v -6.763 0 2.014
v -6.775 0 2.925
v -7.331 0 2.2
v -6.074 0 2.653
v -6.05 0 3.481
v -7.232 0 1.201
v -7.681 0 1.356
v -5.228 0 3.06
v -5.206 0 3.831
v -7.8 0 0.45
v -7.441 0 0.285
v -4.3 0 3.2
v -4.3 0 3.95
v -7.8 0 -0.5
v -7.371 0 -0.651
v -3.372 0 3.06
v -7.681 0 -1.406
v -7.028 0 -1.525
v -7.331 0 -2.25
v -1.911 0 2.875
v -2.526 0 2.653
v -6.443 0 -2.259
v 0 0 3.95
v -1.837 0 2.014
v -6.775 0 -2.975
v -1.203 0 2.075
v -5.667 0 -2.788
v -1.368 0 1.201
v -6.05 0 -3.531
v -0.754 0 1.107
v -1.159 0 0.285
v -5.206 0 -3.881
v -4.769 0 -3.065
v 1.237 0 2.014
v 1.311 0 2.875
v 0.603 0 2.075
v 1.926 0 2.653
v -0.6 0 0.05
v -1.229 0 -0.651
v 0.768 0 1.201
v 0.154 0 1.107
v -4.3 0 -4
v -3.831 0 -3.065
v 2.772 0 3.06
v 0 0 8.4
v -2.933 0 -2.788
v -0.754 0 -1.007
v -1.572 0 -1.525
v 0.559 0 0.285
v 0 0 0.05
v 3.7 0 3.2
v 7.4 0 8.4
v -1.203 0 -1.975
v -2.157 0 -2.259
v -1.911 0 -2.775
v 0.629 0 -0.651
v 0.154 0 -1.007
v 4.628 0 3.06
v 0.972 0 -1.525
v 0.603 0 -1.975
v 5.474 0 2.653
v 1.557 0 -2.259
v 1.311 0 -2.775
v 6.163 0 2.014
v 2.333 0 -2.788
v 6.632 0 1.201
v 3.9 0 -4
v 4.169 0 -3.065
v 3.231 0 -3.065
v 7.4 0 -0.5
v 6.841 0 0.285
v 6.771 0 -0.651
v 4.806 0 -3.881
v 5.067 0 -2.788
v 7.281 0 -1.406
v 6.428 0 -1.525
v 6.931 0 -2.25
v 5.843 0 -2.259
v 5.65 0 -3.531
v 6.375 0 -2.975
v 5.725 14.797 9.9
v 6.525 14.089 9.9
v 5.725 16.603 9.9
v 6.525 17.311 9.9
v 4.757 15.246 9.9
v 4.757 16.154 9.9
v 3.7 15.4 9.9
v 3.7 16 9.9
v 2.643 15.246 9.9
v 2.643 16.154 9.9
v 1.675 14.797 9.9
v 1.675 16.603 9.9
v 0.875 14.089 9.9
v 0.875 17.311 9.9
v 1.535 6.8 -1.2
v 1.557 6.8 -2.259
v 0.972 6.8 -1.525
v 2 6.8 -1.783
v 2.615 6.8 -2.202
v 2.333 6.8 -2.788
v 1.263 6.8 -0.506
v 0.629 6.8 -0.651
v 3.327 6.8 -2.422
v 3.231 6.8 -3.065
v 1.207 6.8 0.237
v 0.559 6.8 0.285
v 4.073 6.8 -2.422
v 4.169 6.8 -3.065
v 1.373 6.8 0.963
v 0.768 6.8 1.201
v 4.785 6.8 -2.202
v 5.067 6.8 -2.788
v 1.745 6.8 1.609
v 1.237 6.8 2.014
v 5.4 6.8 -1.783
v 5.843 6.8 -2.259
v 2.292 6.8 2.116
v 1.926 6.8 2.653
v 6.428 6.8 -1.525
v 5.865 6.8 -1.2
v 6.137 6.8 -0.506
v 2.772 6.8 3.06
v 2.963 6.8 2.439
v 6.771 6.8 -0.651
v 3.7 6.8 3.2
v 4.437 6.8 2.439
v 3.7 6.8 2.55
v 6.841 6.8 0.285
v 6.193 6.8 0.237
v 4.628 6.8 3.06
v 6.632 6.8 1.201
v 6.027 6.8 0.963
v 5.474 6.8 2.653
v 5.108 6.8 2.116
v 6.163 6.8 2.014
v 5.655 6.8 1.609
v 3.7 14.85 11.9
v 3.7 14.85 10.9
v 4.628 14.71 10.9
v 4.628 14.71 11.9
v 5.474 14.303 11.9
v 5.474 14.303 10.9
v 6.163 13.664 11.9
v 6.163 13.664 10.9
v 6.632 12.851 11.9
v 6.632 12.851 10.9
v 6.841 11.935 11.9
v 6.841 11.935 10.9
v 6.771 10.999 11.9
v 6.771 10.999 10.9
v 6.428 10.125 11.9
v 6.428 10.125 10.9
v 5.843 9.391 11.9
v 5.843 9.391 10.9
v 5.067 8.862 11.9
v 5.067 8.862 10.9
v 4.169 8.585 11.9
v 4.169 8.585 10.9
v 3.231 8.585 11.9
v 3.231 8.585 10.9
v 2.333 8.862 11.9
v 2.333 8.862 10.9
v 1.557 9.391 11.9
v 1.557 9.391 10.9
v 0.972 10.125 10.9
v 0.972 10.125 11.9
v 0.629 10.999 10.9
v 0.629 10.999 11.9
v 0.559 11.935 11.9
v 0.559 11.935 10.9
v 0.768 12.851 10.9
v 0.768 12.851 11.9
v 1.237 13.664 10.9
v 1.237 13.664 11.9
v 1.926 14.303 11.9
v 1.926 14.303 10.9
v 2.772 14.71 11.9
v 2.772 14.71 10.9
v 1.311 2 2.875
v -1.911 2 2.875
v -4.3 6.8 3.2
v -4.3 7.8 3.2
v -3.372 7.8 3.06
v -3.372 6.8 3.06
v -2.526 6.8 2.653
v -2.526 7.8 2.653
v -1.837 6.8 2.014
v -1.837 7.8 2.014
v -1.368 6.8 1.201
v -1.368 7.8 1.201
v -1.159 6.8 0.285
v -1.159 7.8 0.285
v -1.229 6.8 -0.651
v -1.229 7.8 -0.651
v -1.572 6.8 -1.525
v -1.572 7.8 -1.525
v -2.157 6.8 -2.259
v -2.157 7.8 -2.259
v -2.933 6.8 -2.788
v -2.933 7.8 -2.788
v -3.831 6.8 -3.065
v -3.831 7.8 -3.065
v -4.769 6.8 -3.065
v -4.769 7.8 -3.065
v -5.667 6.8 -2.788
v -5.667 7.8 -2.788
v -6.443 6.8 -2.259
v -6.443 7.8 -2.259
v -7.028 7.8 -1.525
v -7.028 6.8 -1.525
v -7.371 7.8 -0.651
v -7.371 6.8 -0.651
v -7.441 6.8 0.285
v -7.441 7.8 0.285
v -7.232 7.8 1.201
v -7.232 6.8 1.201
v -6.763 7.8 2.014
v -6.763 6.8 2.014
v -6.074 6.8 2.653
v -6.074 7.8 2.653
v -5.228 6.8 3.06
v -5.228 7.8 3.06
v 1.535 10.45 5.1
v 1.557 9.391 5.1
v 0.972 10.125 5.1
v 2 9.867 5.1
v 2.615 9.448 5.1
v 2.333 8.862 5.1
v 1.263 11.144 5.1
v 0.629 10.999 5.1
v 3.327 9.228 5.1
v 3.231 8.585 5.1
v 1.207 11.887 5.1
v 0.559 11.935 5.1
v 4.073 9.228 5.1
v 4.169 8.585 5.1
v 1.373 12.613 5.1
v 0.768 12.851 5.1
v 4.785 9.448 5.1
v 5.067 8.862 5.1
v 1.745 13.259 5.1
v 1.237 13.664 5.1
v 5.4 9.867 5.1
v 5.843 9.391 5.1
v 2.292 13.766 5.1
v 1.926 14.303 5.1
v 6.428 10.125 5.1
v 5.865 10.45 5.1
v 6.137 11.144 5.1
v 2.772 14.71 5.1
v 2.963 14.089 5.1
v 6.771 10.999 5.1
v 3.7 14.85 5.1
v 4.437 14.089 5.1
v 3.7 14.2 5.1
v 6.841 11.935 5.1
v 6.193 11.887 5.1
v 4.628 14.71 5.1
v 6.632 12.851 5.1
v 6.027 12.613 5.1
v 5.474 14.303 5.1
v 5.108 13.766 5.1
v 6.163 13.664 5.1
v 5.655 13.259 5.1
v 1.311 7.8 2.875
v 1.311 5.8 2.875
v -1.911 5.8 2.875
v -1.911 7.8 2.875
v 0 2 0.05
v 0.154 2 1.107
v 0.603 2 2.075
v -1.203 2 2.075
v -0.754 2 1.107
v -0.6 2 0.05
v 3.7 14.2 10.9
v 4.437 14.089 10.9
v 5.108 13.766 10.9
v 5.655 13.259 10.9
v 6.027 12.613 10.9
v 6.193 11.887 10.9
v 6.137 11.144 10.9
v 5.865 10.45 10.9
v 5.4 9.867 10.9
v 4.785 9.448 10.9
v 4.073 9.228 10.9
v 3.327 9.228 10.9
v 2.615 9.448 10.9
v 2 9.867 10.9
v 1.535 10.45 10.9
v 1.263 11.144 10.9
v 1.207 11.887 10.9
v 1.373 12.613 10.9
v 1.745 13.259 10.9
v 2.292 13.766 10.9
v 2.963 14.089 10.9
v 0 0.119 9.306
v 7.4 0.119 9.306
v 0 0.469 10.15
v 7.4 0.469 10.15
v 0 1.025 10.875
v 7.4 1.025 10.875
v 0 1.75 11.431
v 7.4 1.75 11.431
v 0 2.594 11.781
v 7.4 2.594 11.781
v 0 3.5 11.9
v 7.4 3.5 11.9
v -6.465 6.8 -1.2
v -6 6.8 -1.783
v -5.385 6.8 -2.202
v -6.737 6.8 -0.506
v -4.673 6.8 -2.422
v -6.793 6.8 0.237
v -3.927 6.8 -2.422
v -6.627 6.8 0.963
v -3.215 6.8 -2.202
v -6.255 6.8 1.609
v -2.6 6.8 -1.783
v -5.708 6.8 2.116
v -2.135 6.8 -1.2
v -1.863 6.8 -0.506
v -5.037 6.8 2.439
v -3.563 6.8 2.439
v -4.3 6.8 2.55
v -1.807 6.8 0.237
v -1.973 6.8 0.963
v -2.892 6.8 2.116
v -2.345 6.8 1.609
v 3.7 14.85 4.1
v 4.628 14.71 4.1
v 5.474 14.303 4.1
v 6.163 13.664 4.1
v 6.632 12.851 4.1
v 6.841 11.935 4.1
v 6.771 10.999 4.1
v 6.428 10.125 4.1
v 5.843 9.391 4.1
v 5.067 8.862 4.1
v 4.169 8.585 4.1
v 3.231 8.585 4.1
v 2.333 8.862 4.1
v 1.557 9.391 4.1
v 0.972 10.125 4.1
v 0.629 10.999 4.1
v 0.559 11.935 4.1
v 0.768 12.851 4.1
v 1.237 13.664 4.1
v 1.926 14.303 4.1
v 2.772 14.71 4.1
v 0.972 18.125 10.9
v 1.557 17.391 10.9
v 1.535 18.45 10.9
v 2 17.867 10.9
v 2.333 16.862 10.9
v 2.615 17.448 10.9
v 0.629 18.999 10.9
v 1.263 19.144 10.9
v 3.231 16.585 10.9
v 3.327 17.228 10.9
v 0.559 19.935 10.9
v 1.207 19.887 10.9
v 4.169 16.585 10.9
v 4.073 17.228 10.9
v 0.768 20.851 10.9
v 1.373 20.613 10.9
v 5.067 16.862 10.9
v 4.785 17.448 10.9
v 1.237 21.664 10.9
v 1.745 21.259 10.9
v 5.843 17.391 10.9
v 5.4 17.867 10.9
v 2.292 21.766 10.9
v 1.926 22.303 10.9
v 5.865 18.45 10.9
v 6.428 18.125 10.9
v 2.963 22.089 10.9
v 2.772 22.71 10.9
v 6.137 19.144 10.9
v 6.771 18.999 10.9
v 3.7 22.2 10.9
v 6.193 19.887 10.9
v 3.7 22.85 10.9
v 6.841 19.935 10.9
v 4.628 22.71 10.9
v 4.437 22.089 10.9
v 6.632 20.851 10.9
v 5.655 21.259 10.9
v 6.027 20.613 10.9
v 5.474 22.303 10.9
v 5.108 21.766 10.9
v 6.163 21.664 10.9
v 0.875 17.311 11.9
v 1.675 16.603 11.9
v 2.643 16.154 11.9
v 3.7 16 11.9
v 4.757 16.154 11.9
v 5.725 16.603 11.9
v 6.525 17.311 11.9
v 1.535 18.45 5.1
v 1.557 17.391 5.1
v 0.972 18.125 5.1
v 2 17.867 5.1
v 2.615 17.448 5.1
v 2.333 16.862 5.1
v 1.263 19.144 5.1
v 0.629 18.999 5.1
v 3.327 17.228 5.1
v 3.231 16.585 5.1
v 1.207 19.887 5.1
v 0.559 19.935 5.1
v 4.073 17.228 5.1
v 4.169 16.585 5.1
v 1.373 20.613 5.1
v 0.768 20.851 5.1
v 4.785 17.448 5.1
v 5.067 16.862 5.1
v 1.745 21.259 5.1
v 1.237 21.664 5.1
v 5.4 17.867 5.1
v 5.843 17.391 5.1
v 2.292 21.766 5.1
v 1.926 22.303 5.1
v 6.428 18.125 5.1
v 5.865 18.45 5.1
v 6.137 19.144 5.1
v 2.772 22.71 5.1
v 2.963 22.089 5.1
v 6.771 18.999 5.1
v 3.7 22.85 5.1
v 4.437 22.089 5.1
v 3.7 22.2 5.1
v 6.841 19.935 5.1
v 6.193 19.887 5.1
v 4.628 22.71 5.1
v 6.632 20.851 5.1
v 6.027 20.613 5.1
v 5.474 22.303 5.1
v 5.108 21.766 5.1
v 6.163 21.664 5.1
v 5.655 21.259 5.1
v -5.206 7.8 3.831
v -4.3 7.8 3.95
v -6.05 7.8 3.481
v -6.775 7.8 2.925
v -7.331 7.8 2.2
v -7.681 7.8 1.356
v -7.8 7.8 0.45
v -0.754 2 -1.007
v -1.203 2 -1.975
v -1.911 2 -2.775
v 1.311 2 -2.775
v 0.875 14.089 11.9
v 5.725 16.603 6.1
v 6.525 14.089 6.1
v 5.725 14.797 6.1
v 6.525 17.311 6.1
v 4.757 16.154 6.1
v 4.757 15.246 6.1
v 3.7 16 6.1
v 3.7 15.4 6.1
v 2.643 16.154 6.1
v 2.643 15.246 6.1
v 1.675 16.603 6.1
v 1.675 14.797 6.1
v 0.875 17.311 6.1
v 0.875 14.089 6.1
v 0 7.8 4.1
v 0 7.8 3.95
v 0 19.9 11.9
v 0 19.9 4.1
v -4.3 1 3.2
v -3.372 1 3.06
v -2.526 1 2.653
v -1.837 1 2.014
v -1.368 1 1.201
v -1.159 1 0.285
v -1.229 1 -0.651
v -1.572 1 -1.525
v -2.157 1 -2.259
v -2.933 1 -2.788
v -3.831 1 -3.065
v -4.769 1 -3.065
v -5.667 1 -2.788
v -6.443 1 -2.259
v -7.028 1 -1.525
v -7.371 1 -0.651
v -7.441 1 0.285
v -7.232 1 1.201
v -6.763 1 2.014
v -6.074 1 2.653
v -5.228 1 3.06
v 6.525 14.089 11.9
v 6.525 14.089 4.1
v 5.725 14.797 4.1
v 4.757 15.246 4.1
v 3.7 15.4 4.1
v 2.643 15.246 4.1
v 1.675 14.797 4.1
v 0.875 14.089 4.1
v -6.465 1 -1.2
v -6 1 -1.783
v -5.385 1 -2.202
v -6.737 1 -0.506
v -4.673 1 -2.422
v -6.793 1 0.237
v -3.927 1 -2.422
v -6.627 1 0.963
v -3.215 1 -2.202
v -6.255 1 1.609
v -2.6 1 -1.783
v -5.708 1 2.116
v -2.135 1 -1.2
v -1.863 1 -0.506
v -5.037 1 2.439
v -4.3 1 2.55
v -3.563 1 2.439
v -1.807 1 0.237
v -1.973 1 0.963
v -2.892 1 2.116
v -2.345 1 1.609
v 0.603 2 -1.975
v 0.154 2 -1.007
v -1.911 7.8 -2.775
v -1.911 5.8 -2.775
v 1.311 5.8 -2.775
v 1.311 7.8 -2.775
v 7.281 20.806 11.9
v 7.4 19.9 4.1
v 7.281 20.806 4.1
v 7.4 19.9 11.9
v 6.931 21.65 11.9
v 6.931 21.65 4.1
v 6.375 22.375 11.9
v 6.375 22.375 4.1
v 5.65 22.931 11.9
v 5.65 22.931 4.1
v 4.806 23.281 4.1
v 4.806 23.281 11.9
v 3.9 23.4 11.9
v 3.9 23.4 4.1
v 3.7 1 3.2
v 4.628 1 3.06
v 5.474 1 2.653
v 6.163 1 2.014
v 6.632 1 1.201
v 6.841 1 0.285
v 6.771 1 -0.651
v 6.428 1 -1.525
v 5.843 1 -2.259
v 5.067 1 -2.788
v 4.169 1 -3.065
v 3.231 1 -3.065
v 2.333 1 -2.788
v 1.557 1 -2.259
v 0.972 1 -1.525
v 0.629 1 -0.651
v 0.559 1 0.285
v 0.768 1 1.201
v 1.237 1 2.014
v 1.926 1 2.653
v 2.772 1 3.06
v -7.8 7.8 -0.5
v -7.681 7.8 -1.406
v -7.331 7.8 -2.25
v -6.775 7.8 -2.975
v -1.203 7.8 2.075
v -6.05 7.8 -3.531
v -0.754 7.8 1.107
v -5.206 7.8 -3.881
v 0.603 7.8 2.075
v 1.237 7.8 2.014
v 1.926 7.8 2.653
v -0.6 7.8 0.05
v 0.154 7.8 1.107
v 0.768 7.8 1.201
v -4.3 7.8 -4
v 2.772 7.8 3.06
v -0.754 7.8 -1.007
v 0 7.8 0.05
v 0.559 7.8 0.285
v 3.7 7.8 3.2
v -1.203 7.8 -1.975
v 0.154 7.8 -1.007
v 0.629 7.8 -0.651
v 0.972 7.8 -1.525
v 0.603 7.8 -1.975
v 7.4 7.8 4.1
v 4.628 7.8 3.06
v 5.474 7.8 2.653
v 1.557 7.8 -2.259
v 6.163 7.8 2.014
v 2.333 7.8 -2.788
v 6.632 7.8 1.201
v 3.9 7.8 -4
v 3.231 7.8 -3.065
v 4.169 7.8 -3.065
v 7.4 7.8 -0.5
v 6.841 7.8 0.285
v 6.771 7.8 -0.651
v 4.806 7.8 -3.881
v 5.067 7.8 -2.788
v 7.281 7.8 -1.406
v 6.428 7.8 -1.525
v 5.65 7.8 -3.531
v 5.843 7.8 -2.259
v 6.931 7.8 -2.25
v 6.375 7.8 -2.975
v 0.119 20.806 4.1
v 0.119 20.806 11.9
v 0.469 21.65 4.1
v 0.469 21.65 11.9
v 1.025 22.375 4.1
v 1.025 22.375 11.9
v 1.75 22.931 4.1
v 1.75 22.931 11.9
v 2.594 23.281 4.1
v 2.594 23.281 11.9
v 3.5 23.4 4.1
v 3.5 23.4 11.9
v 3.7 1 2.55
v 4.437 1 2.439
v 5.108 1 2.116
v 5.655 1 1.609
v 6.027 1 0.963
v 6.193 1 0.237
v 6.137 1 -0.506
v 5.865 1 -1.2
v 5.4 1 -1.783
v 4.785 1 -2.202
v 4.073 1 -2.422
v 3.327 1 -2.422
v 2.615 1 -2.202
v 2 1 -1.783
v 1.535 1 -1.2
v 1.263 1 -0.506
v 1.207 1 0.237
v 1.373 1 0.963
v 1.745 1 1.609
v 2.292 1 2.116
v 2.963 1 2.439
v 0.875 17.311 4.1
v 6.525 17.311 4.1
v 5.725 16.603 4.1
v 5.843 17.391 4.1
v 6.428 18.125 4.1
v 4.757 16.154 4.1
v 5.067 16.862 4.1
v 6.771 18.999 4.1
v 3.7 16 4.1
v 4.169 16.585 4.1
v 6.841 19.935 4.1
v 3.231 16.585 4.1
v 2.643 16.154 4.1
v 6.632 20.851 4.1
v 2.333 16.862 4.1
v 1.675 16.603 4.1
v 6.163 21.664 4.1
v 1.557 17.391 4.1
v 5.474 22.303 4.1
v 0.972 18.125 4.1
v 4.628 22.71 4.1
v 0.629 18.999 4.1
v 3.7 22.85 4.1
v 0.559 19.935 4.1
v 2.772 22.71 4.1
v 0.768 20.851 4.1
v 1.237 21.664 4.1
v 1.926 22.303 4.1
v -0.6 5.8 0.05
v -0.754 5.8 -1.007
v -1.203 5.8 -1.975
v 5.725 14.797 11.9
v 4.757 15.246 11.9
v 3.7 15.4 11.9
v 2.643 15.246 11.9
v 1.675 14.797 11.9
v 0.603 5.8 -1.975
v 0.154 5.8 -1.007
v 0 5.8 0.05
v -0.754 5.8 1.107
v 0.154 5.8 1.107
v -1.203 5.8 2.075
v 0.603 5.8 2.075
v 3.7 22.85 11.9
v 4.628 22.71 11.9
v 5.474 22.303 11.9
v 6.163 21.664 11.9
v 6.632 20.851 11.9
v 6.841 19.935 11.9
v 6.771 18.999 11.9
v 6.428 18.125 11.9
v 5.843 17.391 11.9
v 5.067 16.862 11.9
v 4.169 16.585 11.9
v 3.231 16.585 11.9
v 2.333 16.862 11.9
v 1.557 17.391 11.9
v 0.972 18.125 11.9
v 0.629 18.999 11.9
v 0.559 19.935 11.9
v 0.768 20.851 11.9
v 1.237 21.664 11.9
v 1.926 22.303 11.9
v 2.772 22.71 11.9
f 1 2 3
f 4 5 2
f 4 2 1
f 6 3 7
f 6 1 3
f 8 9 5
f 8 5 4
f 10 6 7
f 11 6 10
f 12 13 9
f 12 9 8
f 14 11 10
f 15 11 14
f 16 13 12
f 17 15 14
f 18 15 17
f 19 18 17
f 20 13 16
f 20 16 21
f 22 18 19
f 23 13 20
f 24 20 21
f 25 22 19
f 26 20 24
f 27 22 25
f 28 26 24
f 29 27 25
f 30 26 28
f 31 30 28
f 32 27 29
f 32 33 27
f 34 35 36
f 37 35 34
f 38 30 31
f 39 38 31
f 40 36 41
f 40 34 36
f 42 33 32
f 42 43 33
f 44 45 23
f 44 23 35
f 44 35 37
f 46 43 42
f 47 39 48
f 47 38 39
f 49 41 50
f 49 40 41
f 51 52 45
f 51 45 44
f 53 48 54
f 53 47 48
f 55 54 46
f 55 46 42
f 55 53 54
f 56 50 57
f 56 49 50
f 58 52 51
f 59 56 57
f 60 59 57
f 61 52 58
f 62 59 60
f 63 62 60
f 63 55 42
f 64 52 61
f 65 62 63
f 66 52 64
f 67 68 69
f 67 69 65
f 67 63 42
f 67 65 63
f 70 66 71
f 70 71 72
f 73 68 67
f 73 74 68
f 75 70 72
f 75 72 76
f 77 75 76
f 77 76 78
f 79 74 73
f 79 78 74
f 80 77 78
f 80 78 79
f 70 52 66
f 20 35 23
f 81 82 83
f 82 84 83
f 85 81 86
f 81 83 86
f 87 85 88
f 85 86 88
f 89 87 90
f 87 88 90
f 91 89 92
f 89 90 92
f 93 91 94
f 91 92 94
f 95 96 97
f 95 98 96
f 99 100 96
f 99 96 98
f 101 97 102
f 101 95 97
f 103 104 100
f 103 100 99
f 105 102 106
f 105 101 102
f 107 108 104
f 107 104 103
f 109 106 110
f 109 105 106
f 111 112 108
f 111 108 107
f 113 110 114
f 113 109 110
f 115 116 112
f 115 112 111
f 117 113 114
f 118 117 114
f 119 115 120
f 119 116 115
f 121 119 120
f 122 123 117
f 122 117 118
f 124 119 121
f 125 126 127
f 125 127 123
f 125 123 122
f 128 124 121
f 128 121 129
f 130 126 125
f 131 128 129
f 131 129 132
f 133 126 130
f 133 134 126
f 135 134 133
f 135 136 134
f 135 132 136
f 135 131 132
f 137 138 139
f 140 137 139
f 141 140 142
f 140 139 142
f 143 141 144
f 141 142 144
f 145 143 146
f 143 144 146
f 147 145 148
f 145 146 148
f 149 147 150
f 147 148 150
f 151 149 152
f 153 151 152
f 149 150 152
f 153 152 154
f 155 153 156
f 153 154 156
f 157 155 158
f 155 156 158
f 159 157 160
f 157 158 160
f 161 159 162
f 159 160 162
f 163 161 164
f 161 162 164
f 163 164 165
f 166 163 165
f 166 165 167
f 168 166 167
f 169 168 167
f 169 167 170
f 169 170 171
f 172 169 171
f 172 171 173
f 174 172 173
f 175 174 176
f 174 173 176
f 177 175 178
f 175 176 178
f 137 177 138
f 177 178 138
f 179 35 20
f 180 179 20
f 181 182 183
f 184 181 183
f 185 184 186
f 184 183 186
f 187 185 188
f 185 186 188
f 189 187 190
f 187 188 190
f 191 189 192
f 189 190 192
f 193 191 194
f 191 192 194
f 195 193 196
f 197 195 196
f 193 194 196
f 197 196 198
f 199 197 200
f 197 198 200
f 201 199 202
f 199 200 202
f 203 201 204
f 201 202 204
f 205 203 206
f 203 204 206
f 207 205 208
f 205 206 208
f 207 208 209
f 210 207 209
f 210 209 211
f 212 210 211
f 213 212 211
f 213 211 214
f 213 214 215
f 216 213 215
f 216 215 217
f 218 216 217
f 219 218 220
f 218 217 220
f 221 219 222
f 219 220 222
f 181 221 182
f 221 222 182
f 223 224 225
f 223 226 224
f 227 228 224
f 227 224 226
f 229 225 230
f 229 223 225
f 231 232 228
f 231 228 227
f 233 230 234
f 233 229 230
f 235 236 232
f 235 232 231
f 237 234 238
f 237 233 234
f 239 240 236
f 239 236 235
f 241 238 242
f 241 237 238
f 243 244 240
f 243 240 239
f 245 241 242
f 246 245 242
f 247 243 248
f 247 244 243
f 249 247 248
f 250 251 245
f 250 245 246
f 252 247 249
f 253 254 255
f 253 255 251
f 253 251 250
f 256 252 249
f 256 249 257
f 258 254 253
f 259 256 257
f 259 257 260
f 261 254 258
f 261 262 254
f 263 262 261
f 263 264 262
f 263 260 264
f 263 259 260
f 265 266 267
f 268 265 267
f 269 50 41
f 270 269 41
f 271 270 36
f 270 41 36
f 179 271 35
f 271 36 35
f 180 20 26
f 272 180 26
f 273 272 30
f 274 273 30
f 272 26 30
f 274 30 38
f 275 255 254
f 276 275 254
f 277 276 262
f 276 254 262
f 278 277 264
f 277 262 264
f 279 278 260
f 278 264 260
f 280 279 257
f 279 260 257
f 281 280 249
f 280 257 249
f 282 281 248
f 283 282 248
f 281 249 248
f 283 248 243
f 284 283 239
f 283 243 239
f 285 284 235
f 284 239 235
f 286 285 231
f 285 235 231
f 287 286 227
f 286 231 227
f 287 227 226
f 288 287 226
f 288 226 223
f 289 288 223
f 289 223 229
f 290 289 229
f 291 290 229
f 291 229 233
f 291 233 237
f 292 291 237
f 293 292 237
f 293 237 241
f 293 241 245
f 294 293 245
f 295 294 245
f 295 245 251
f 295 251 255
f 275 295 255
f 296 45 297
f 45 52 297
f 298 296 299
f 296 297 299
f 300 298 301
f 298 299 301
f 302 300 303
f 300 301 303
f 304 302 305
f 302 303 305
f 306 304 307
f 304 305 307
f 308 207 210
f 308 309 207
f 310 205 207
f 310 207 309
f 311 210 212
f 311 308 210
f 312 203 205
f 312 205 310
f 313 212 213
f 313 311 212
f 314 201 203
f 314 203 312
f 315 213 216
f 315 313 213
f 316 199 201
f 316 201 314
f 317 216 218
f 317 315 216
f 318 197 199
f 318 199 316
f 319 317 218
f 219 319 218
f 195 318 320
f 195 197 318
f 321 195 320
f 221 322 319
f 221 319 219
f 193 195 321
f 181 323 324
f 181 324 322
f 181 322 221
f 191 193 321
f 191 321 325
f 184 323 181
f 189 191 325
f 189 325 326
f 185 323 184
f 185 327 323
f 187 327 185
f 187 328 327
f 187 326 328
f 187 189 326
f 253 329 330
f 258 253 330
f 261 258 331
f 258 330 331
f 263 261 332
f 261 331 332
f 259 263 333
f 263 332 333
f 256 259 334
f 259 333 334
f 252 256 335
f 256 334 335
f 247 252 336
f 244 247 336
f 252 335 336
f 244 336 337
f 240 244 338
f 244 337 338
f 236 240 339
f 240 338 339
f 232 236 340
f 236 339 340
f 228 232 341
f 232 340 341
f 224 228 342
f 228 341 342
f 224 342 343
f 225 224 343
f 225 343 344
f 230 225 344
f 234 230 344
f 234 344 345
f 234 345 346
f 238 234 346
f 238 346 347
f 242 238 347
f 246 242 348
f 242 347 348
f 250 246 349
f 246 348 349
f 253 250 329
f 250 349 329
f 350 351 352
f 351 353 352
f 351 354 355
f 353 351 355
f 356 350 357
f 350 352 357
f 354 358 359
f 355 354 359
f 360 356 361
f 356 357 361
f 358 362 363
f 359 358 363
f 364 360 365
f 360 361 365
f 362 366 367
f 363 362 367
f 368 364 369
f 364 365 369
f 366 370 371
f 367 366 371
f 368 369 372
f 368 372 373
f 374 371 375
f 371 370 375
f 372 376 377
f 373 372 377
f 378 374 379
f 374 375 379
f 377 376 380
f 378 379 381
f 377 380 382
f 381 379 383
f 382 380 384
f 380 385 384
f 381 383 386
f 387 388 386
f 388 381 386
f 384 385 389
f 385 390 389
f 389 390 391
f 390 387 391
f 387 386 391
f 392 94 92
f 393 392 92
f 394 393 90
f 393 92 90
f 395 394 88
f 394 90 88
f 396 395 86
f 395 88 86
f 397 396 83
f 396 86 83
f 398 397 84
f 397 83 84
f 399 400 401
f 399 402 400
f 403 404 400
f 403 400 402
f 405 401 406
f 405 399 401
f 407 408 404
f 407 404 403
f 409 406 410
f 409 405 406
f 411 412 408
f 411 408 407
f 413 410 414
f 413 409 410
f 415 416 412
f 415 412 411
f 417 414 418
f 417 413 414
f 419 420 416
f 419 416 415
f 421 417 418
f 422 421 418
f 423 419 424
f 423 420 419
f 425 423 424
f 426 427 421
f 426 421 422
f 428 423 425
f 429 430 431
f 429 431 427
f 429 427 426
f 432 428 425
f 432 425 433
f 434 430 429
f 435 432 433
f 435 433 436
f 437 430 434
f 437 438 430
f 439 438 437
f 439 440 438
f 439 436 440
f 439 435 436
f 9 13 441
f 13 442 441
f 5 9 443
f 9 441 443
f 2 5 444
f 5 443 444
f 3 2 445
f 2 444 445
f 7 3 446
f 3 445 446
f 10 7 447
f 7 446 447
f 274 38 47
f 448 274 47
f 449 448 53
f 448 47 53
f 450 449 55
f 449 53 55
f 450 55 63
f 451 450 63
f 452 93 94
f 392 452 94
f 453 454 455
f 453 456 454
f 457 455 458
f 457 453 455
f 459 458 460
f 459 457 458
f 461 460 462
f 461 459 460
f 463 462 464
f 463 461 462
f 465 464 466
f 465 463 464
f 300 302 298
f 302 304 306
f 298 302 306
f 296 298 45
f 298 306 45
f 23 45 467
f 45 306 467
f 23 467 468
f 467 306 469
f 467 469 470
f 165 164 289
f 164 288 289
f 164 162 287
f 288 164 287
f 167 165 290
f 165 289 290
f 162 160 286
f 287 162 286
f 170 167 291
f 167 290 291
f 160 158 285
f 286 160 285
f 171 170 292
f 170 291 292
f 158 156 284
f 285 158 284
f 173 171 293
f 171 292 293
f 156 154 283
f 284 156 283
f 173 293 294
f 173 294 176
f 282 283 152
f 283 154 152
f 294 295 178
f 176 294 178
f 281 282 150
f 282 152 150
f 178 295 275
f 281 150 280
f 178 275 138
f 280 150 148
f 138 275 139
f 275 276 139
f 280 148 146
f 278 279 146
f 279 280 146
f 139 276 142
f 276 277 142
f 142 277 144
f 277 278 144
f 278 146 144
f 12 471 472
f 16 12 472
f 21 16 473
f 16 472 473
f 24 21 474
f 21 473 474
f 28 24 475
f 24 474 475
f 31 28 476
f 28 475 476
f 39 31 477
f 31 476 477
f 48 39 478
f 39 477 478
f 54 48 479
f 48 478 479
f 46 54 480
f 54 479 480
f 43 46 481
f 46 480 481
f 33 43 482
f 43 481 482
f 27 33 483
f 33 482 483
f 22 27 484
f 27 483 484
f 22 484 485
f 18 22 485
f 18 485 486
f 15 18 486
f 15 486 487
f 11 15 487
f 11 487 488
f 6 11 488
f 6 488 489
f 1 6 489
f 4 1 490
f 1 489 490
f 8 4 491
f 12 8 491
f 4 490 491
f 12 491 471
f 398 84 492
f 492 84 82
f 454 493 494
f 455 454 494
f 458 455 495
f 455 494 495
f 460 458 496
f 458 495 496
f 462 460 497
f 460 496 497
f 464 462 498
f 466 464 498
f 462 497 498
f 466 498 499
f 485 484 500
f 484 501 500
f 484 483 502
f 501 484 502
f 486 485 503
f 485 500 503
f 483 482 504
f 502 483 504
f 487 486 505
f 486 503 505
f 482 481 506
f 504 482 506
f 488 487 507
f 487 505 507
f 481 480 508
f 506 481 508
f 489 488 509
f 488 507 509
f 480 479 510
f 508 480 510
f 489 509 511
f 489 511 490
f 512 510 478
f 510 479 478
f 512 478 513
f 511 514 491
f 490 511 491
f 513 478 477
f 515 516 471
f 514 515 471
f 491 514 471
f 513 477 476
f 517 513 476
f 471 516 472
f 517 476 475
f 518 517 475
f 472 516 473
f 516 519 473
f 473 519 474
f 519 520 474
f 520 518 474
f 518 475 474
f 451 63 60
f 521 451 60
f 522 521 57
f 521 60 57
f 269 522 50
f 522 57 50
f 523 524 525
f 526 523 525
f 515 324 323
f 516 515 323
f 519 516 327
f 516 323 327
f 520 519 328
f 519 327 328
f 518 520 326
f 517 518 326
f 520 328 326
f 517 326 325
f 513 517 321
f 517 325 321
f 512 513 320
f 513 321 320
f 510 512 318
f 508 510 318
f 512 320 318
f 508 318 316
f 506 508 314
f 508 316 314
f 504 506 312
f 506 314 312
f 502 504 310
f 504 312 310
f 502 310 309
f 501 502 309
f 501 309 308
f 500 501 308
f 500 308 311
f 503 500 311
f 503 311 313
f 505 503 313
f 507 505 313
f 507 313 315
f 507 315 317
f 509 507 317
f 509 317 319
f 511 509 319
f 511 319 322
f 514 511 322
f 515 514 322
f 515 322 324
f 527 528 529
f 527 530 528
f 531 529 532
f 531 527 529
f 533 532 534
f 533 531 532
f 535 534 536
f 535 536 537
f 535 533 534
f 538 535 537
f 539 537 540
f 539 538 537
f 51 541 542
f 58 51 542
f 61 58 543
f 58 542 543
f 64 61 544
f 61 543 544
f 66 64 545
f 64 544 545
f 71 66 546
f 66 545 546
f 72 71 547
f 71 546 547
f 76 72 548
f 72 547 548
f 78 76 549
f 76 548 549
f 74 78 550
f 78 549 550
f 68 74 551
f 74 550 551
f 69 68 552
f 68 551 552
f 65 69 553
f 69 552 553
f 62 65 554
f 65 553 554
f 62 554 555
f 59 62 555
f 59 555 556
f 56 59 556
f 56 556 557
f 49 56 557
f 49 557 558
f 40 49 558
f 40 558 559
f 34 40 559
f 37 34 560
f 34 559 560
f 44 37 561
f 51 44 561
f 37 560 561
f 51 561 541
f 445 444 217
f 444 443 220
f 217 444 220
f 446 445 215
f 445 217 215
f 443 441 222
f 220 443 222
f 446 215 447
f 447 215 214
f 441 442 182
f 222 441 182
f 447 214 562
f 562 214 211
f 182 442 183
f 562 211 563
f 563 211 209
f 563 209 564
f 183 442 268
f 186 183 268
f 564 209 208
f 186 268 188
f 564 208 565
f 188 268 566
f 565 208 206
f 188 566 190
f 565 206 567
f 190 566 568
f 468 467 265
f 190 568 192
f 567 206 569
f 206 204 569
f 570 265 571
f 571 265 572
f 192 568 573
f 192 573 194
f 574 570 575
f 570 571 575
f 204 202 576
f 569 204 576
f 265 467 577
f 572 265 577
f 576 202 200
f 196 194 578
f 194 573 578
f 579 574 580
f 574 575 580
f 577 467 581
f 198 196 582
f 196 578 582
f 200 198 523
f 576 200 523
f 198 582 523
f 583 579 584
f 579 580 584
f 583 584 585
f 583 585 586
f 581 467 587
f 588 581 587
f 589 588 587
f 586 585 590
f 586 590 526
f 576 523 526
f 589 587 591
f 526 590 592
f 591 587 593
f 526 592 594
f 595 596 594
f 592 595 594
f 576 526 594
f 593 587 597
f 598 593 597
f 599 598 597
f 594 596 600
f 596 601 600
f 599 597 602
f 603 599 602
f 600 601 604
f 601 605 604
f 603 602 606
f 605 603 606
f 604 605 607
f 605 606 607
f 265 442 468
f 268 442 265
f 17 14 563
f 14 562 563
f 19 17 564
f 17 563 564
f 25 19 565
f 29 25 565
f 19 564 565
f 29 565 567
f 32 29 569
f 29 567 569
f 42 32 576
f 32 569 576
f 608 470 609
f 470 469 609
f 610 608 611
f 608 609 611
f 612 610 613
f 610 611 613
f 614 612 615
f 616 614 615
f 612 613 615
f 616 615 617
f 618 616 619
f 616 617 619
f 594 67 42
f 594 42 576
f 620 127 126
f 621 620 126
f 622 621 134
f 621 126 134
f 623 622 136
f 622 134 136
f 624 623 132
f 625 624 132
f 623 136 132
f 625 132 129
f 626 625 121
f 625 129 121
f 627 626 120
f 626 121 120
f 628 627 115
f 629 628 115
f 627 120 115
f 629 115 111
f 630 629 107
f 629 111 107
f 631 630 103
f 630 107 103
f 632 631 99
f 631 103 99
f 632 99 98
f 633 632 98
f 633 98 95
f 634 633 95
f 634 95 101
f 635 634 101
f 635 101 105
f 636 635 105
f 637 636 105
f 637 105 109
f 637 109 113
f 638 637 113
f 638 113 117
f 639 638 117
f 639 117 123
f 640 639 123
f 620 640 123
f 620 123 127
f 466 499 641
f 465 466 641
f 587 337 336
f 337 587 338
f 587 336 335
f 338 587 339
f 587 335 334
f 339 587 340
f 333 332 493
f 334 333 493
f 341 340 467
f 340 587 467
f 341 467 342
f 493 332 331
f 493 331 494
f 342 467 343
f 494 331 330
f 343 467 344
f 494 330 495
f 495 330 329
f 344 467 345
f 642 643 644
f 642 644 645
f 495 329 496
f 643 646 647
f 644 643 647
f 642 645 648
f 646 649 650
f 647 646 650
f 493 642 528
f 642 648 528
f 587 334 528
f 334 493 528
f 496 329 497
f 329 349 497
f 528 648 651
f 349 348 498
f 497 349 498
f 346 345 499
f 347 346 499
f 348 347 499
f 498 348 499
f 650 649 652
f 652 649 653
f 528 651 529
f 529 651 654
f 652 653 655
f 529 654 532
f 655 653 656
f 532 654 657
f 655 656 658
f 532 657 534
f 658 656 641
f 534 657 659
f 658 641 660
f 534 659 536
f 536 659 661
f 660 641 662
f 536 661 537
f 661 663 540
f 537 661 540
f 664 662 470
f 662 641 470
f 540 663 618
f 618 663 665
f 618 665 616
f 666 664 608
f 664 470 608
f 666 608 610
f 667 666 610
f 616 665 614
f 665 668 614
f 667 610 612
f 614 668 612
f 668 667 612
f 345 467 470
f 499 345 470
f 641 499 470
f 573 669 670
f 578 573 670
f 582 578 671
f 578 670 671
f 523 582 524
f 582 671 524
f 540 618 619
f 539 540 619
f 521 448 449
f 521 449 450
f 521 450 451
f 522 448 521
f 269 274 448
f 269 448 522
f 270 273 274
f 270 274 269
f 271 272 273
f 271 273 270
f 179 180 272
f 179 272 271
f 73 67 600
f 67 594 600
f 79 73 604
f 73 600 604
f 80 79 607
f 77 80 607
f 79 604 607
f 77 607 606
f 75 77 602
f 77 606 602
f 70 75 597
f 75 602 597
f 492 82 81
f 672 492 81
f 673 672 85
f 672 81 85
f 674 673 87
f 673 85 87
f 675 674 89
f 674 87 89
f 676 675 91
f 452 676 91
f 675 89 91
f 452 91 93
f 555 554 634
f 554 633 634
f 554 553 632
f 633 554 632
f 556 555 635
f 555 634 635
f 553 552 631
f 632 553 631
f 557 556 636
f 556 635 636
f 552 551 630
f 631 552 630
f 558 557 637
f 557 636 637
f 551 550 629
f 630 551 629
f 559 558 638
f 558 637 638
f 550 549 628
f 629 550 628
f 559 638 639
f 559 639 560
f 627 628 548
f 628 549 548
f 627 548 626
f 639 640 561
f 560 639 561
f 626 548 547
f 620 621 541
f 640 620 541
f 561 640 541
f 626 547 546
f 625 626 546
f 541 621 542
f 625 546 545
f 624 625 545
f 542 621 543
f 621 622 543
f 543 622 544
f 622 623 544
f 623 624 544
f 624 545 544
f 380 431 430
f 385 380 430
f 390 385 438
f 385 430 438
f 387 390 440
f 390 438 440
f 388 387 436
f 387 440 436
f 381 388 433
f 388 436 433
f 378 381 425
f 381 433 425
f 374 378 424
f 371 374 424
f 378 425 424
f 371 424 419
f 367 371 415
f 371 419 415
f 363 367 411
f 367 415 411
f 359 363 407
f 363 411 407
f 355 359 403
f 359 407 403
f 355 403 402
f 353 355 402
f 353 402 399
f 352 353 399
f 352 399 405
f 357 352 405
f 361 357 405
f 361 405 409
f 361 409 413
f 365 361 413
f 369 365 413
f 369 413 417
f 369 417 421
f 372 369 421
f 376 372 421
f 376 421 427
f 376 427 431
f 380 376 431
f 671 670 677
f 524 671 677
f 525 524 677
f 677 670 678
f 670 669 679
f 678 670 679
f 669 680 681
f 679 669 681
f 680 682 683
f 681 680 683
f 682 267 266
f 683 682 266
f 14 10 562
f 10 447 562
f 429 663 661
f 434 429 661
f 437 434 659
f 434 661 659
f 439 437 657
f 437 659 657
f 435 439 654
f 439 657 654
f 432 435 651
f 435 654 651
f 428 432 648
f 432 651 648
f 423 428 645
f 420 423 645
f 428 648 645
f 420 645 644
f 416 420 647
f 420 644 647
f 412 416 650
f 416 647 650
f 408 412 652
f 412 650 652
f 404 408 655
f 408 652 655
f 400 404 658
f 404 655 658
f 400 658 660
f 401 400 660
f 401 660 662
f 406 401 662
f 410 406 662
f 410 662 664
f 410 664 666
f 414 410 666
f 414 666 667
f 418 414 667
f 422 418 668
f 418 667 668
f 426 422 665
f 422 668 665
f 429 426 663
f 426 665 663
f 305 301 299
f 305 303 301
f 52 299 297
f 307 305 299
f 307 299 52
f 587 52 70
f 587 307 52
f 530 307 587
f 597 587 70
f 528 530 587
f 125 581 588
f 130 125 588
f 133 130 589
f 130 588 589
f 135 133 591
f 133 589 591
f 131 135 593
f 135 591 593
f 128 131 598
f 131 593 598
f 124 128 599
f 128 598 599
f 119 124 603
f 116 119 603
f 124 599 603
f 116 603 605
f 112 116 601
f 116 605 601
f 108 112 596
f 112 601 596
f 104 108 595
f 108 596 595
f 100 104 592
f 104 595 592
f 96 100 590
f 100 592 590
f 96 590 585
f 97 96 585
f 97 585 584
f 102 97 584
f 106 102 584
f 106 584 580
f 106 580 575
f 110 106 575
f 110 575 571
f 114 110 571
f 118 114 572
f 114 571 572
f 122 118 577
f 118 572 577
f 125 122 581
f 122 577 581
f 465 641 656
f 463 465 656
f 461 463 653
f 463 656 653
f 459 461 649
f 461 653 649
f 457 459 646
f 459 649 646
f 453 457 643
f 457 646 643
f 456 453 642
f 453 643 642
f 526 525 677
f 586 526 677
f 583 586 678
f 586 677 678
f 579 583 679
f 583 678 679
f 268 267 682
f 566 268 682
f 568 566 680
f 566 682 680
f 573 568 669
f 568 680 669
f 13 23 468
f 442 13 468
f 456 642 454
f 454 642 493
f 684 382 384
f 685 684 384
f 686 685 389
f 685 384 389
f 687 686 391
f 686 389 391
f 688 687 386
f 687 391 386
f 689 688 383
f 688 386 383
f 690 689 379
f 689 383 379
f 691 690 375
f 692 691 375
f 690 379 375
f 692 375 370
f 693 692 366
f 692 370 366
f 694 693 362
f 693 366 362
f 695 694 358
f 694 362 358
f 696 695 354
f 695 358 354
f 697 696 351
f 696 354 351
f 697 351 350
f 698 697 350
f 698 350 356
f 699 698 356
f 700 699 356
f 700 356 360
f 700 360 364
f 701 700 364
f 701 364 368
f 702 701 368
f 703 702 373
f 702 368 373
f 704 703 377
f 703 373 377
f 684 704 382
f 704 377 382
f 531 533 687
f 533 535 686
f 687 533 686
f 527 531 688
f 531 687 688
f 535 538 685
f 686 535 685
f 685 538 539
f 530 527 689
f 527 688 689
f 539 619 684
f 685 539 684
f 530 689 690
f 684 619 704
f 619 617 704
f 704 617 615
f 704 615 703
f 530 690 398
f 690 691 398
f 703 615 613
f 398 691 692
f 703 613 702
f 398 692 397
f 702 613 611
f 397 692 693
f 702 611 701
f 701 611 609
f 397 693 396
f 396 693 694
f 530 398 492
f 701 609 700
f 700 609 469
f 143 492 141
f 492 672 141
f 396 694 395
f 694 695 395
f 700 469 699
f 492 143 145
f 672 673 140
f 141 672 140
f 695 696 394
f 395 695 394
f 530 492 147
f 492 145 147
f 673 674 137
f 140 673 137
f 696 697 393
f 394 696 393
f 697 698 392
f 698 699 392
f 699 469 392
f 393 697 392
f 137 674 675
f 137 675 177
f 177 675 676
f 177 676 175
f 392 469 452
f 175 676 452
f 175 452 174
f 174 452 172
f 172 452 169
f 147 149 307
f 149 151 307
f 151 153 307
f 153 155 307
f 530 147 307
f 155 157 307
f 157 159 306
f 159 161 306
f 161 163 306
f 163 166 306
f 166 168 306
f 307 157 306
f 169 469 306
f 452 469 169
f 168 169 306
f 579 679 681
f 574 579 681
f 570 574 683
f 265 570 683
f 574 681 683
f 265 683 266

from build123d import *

# Parameters (mm, degrees)
SKETCH_3_W             = 0.1
SKETCH_3_H             = 7.8
SKETCH_3_W_2           = 8
EXTRUDE_1_DEPTH        = 7.4
CUT_EXTRUDE_1_REACH    = 22.97
SKETCH_4_R             = 2.5
SKETCH_4_3_R           = 3.15
SKETCH_4_3_R_2         = 2.5
CUT_EXTRUDE_2_DEPTH    = 1
CUT_EXTRUDE_START      = -6.8
SKETCH_4_4_R           = 3.15
SKETCH_4_4_R_2         = 2.5
CUT_EXTRUDE_3_DEPTH    = 1
SKETCH_5_R             = 2.5
CUT_EXTRUDE_4_DEPTH    = 26.844341741
SKETCH_5_3_R           = 3.15
SKETCH_5_3_R_2         = 2.5
CUT_EXTRUDE_5_DEPTH    = 1
SKETCH_5_4_R           = 3.15
SKETCH_5_4_R_2         = 2.5
CUT_EXTRUDE_6_DEPTH    = 1
CUT_EXTRUDE_9_DEPTH    = 2
CUT_EXTRUDE_START_2    = -5.8
CUT_EXTRUDE_10_DEPTH   = 2
PATTERN_LINEAR_1_COUNT = 2
PATTERN_LINEAR_1_PITCH = 8
SKETCH_7_W             = 7.95
SKETCH_7_H             = 7.8
EXTRUDE_2_DEPTH        = 7.8
PATTERN_LINEAR_2_COUNT = 2
PATTERN_LINEAR_2_PITCH = 8
CUT_EXTRUDE_11_DEPTH   = 2
CUT_EXTRUDE_12_DEPTH   = 2
FILLET_1_R             = 3.5


with BuildPart() as part:
    # 草图3 → 凸台-拉伸1 (new body)
    with BuildSketch(Plane(origin=(0, 0, 0), x_dir=(0, 0, -1), z_dir=(1, 0, 0))):
        with Locations((-4.05, 3.9)):
            Rectangle(SKETCH_3_W, SKETCH_3_H)
        Polygon((-11.9, 0), (-4.1, 0), (-4.1, 7.8), (-4.1, 23.4), (-11.9, 23.4), align=None)
        with Locations((0, 3.9)):
            Rectangle(SKETCH_3_W_2, SKETCH_3_H)
    extrude(amount=EXTRUDE_1_DEPTH)

    # 草图4 → 切除-拉伸1 (cut, up to next)
    with BuildSketch(Plane(origin=(0, 7.8, 0), x_dir=(1, 0, 0), z_dir=(0, 1, 0)), mode=Mode.PRIVATE) as cut_extrude_1_sk1:
        with Locations(Location((3.7, -0.05, 0), (0, 0, 270))):
            Circle(SKETCH_4_R)
    cut_extrude_1_tool1 = extrude(cut_extrude_1_sk1.sketch, amount=-CUT_EXTRUDE_1_REACH, mode=Mode.PRIVATE) & part.part
    cut_extrude_1 = cut_extrude_1_tool1.solids().sort_by_distance((3.7, 7.8, 0.05))[0]
    add(cut_extrude_1, mode=Mode.SUBTRACT)

    # 草图4<3> → 切除-拉伸2 (cut)
    with BuildSketch(Plane(origin=(0, 7.8, 0), x_dir=(1, 0, 0), z_dir=(0, 1, 0))):
        with Locations(Location((3.7, -0.05, 0), (0, 0, 270))):
            Circle(SKETCH_4_3_R)
        with Locations(Location((3.7, -0.05, 0), (0, 0, 270))):
            Circle(SKETCH_4_3_R_2, mode=Mode.SUBTRACT)
    cut_extrude_2 = extrude(amount=-CUT_EXTRUDE_2_DEPTH, mode=Mode.SUBTRACT)

    # 草图4<4> → 切除-拉伸3 (cut)
    with BuildSketch(Plane(origin=(0, 7.8, 0), x_dir=(1, 0, 0), z_dir=(0, 1, 0)).offset(CUT_EXTRUDE_START)):
        with Locations(Location((3.7, -0.05, 0), (0, 0, 270))):
            Circle(SKETCH_4_4_R)
        with Locations(Location((3.7, -0.05, 0), (0, 0, 270))):
            Circle(SKETCH_4_4_R_2, mode=Mode.SUBTRACT)
    cut_extrude_3 = extrude(amount=-CUT_EXTRUDE_3_DEPTH, mode=Mode.SUBTRACT)

    # 草图5 → 切除-拉伸4 (cut, through all)
    with BuildSketch(Plane(origin=(0, 0, 4.1), x_dir=(-1, 0, 0), z_dir=(0, 0, -1))):
        with Locations(Location((-3.7, 11.7, 0), (0, 0, 90))):
            Circle(SKETCH_5_R)
    cut_extrude_4 = extrude(amount=-CUT_EXTRUDE_4_DEPTH, mode=Mode.SUBTRACT)

    # 草图5<3> → 切除-拉伸5 (cut)
    with BuildSketch(Plane(origin=(0, 0, 4.1), x_dir=(-1, 0, 0), z_dir=(0, 0, -1))):
        with Locations(Location((-3.7, 11.7, 0), (0, 0, 90))):
            Circle(SKETCH_5_3_R)
        with Locations(Location((-3.7, 11.7, 0), (0, 0, 90))):
            Circle(SKETCH_5_3_R_2, mode=Mode.SUBTRACT)
    cut_extrude_5 = extrude(amount=-CUT_EXTRUDE_5_DEPTH, mode=Mode.SUBTRACT)

    # 草图5<4> → 切除-拉伸6 (cut)
    with BuildSketch(Plane(origin=(0, 0, 4.1), x_dir=(-1, 0, 0), z_dir=(0, 0, -1)).offset(CUT_EXTRUDE_START)):
        with Locations(Location((-3.7, 11.7, 0), (0, 0, 90))):
            Circle(SKETCH_5_4_R)
        with Locations(Location((-3.7, 11.7, 0), (0, 0, 90))):
            Circle(SKETCH_5_4_R_2, mode=Mode.SUBTRACT)
    cut_extrude_6 = extrude(amount=-CUT_EXTRUDE_6_DEPTH, mode=Mode.SUBTRACT)

    # 草图6 → 切除-拉伸9 (cut)
    with BuildSketch(Plane(origin=(0, 0, 4.1), x_dir=(-1, 0, 0), z_dir=(0, 0, -1))):
        with BuildLine():
            ThreePointArc((-6.525, 14.089429848), (-3.7, 15.4), (-0.875, 14.089429848))
            Line((-0.875, 14.089429848), (-0.875, 17.310570152))
            ThreePointArc((-0.875, 17.310570152), (-3.7, 16), (-6.525, 17.310570152))
            Line((-6.525, 17.310570152), (-6.525, 14.089429848))
        make_face()
    extrude(amount=-CUT_EXTRUDE_9_DEPTH, mode=Mode.SUBTRACT)

    # 草图6<3> → 切除-拉伸10 (cut)
    with BuildSketch(Plane(origin=(0, 0, 4.1), x_dir=(-1, 0, 0), z_dir=(0, 0, -1)).offset(CUT_EXTRUDE_START_2)):
        with BuildLine():
            ThreePointArc((-6.525, 14.089429848), (-3.7, 15.4), (-0.875, 14.089429848))
            Line((-0.875, 14.089429848), (-0.875, 17.310570152))
            ThreePointArc((-0.875, 17.310570152), (-3.7, 16), (-6.525, 17.310570152))
            Line((-6.525, 17.310570152), (-6.525, 14.089429848))
        make_face()
    extrude(amount=-CUT_EXTRUDE_10_DEPTH, mode=Mode.SUBTRACT)

    # 阵列(线性)1: 切除-拉伸4, 切除-拉伸5, 切除-拉伸6 ×2
    with Locations(*[(0, i * PATTERN_LINEAR_1_PITCH, 0) for i in range(1, PATTERN_LINEAR_1_COUNT)]):
        add(cut_extrude_4, mode=Mode.SUBTRACT)
        add(cut_extrude_5, mode=Mode.SUBTRACT)
        add(cut_extrude_6, mode=Mode.SUBTRACT)

    # 草图7 → 凸台-拉伸2 (add)
    with BuildSketch(Plane(origin=(0, 0, 0), x_dir=(0, 0, -1), z_dir=(1, 0, 0))):
        with Locations((0.025, 3.9)):
            Rectangle(SKETCH_7_W, SKETCH_7_H)
    extrude(amount=-EXTRUDE_2_DEPTH)

    # 阵列(线性)2: 切除-拉伸1, 切除-拉伸2, 切除-拉伸3 ×2
    with Locations(*[(-i * PATTERN_LINEAR_2_PITCH, 0, 0) for i in range(1, PATTERN_LINEAR_2_COUNT)]):
        add(cut_extrude_1, mode=Mode.SUBTRACT)
        add(cut_extrude_2, mode=Mode.SUBTRACT)
        add(cut_extrude_3, mode=Mode.SUBTRACT)

    # 草图9 → 切除-拉伸11 (cut)
    with BuildSketch(Plane.XZ):
        with BuildLine():
            ThreePointArc((0, 0.05), (0.343596386, 1.607098192), (1.310570152, 2.875))
            Line((1.310570152, 2.875), (-1.910570152, 2.875))
            ThreePointArc((-1.910570152, 2.875), (-0.943596386, 1.607098192), (-0.6, 0.05))
            Line((-0.6, 0.05), (0, 0.05))
        make_face()
        with BuildLine():
            Line((-1.910570152, -2.775), (1.310570152, -2.775))
            ThreePointArc((1.310570152, -2.775), (0.343596386, -1.507098192), (0, 0.05))
            Line((0, 0.05), (-0.6, 0.05))
            ThreePointArc((-0.6, 0.05), (-0.943596386, -1.507098192), (-1.910570152, -2.775))
        make_face()
    extrude(amount=-CUT_EXTRUDE_11_DEPTH, mode=Mode.SUBTRACT)

    # 草图9<3> → 切除-拉伸12 (cut)
    with BuildSketch(Plane.XZ.offset(CUT_EXTRUDE_START_2)):
        with BuildLine():
            ThreePointArc((0, 0.05), (0.343596386, 1.607098192), (1.310570152, 2.875))
            Line((1.310570152, 2.875), (-1.910570152, 2.875))
            ThreePointArc((-1.910570152, 2.875), (-0.943596386, 1.607098192), (-0.6, 0.05))
            Line((-0.6, 0.05), (0, 0.05))
        make_face()
        with BuildLine():
            Line((-1.910570152, -2.775), (1.310570152, -2.775))
            ThreePointArc((1.310570152, -2.775), (0.343596386, -1.507098192), (0, 0.05))
            Line((0, 0.05), (-0.6, 0.05))
            ThreePointArc((-0.6, 0.05), (-0.943596386, -1.507098192), (-1.910570152, -2.775))
        make_face()
    extrude(amount=-CUT_EXTRUDE_12_DEPTH, mode=Mode.SUBTRACT)

    # 圆角1
    fillet_1_edges = [part.edges().sort_by_distance(p)[0] for p in [
        (7.4, 23.4, 8),
        (0, 23.4, 8),
        (-7.8, 3.9, -4),
        (-7.8, 3.9, 3.95),
        (3.7, 0, 11.9),
        (7.4, 3.9, -4),
    ]]
    fillet(fillet_1_edges, radius=FILLET_1_R)


solid = part.part
